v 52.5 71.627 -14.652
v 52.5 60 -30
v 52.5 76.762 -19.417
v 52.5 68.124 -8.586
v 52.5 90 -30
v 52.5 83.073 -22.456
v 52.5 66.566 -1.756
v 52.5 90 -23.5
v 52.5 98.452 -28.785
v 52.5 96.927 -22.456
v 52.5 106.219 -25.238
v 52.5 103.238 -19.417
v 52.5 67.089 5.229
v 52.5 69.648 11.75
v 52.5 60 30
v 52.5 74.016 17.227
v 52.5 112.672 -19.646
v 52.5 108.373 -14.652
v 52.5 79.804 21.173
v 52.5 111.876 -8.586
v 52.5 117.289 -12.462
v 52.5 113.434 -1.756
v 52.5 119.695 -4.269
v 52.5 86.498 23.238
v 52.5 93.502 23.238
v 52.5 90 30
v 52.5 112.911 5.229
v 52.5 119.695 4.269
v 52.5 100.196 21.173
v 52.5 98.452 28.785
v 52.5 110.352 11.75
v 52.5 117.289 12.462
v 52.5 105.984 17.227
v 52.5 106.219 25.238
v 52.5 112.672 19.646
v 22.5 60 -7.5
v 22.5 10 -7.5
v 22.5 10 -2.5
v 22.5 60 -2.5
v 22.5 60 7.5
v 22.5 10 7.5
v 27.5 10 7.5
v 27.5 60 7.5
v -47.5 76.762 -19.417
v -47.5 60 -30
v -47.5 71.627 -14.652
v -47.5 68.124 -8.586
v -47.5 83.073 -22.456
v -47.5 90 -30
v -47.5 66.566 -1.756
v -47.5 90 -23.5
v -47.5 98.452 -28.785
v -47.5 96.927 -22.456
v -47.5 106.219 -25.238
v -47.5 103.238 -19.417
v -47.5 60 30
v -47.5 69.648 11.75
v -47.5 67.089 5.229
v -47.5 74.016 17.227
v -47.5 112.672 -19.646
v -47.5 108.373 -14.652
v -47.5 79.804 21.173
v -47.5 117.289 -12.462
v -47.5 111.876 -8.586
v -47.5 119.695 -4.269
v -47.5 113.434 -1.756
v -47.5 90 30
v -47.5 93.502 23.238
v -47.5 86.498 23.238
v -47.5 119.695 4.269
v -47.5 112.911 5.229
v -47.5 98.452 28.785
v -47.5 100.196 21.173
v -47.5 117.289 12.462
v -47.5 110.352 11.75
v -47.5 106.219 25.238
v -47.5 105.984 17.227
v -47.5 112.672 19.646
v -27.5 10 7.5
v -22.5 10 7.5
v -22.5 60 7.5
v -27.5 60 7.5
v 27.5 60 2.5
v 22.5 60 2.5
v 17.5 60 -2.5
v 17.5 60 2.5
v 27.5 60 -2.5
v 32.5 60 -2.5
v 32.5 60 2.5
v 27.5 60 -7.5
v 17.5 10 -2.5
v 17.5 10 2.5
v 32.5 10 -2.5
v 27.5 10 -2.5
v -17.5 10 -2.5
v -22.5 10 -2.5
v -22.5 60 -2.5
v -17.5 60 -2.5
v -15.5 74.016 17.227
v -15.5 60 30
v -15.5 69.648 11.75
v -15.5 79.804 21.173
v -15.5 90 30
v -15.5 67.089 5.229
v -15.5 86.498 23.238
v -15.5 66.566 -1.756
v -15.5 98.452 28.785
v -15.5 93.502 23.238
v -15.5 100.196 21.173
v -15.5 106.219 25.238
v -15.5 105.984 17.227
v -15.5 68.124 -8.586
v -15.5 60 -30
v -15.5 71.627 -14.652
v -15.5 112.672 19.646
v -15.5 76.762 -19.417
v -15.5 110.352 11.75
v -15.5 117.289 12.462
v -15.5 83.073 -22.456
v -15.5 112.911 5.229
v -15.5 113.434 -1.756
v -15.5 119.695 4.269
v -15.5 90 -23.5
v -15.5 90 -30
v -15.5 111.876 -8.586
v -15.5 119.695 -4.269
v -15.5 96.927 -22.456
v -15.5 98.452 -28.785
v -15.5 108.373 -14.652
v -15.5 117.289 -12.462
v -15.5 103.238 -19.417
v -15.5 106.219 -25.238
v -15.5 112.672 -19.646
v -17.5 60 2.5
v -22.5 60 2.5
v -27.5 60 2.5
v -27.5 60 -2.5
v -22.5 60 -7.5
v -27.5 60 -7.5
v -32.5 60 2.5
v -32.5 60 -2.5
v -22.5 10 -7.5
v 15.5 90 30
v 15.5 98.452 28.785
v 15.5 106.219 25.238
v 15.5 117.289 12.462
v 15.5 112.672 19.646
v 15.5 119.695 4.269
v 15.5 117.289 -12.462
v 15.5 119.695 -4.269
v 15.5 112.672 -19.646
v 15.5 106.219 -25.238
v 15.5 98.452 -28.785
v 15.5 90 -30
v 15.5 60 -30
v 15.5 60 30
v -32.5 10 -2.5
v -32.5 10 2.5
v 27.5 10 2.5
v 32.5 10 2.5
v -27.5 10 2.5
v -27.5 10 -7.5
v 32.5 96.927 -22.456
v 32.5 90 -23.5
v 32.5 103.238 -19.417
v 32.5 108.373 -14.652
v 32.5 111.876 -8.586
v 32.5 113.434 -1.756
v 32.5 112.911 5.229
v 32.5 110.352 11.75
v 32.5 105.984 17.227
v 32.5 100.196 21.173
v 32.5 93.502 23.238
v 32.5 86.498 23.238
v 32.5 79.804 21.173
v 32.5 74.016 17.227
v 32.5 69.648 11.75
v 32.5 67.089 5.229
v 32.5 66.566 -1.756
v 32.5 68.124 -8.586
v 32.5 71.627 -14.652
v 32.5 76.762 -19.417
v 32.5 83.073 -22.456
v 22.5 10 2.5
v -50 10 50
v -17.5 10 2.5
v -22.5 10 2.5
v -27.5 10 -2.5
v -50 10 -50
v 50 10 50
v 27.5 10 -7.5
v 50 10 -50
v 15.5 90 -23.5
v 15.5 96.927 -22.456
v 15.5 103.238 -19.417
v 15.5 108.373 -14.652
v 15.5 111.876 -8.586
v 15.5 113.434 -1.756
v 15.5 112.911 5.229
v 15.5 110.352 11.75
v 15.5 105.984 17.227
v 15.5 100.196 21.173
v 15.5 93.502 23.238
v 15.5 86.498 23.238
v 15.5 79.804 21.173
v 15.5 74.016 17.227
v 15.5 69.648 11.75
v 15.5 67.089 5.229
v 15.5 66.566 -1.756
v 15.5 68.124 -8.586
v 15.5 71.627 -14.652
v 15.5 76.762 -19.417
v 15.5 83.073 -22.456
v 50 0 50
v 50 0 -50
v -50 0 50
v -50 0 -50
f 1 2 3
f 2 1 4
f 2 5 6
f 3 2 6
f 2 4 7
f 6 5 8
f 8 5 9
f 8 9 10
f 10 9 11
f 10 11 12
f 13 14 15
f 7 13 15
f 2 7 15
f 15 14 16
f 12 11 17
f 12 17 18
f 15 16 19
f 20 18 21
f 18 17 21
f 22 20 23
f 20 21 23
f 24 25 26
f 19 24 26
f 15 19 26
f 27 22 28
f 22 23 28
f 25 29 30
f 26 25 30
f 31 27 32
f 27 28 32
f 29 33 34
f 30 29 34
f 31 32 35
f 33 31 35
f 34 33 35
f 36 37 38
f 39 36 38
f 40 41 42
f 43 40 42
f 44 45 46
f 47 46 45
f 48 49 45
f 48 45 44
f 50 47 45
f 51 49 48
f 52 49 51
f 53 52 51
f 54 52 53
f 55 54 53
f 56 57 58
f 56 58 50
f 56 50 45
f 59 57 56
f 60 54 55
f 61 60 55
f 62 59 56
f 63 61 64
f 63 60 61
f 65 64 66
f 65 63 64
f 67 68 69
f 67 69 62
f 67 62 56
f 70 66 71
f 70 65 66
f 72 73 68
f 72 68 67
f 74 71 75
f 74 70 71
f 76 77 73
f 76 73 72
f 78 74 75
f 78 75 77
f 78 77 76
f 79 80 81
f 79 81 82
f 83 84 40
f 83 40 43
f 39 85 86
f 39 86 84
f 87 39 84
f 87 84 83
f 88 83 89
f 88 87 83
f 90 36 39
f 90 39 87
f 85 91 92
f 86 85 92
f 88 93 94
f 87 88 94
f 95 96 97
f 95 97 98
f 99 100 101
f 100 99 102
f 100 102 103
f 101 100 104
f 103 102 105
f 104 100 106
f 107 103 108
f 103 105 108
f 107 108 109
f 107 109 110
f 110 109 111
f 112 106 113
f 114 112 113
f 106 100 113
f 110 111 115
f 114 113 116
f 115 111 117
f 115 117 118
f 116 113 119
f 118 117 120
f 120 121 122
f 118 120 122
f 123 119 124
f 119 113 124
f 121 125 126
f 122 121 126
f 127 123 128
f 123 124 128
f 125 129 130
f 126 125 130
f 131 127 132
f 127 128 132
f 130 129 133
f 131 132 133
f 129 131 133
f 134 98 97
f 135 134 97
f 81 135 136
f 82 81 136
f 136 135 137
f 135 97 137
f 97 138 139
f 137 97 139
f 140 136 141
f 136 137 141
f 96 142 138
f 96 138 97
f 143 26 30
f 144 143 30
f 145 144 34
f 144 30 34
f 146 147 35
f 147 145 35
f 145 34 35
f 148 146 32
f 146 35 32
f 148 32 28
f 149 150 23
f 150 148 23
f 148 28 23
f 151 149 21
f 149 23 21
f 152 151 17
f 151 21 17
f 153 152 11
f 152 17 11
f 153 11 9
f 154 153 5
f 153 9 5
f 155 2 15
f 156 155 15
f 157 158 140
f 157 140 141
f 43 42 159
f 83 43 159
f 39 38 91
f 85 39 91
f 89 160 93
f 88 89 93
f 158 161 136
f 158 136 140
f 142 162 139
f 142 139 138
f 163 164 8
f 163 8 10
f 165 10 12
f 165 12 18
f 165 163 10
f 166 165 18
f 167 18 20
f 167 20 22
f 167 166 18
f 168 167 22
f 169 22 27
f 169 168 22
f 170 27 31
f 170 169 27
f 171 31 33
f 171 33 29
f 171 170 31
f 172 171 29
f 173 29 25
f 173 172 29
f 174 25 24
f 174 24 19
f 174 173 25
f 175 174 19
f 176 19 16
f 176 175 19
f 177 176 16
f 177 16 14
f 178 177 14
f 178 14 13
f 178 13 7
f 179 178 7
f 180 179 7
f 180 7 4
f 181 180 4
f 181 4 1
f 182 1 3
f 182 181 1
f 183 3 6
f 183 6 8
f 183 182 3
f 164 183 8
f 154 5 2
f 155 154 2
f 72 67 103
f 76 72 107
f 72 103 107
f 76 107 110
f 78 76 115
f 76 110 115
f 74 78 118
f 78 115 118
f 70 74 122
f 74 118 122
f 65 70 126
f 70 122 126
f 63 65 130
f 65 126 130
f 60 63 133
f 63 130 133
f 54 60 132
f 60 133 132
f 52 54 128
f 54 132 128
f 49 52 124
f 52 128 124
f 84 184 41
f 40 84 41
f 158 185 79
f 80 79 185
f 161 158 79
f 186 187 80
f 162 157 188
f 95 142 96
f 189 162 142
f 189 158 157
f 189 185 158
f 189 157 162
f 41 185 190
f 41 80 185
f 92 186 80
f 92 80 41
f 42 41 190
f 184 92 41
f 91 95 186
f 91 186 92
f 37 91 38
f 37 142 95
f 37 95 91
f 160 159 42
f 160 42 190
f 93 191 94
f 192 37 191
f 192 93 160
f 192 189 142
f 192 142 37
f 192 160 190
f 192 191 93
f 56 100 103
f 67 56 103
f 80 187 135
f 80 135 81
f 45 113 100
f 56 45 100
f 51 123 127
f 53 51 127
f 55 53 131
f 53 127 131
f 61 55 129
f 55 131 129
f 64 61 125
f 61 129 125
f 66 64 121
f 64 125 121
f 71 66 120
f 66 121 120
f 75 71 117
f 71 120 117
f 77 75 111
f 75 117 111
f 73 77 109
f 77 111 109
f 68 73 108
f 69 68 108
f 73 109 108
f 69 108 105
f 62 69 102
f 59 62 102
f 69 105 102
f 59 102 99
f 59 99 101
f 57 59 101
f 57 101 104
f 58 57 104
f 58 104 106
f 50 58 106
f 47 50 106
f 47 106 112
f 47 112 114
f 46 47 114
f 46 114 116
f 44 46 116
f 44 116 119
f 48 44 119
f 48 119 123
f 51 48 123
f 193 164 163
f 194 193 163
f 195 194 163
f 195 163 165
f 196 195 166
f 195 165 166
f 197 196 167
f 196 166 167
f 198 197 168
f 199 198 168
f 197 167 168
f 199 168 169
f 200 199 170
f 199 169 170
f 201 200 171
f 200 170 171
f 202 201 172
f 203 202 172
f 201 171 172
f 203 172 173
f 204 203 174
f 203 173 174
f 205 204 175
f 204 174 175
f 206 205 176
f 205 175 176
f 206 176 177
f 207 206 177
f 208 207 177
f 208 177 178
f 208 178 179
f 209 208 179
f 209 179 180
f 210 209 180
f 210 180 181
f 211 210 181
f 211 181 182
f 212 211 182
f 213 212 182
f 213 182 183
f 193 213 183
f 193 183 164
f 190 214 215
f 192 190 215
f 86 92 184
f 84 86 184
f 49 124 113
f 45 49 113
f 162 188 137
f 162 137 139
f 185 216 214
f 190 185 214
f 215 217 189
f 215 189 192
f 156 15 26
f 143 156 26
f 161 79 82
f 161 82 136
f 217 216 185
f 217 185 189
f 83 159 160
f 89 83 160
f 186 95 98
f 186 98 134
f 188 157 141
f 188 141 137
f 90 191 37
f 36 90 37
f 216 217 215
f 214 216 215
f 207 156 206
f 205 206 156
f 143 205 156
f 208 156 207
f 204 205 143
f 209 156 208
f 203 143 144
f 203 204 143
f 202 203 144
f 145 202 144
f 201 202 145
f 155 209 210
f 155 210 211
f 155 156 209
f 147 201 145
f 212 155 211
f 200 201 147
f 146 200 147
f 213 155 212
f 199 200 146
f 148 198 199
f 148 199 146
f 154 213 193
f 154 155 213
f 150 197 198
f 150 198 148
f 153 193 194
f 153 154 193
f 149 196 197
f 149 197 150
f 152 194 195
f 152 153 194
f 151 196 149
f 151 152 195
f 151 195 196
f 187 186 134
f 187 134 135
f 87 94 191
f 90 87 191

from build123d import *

# Parameters (mm, degrees)
ESQUISSE1_W             = 100
ESQUISSE1_H             = 100
BOSS_EXTRU_1_DEPTH      = 10
BOSS_EXTRU_2_DEPTH      = 50
ESQUISSE3_R             = 23.5
BOSS_EXTRU_3_DEPTH      = 20
BOSS_EXTRU_3_DEPTH_BACK = 80
ESQUISSE4_W             = 31
ESQUISSE4_H             = 60
ENL_V_MAT_EXTRU_1_DEPTH = 60


with BuildPart() as part:
    # Esquisse1 → Boss.-Extru.1 (new body)
    with BuildSketch(Plane(origin=(0, 0, 0), x_dir=(1, 0, 0), z_dir=(0, 1, 0))):
        Rectangle(ESQUISSE1_W, ESQUISSE1_H)
    extrude(amount=BOSS_EXTRU_1_DEPTH)

    # Esquisse2 → Boss.-Extru.2 (add)
    with BuildSketch(Plane(origin=(0, 10, 0), x_dir=(1, 0, 0), z_dir=(0, 1, 0))):
        Polygon((-27.5, 2.5), (-27.5, 7.5), (-22.5, 7.5), (-22.5, 2.5), (-17.5, 2.5), (-17.5, -2.5), (-22.5, -2.5), (-22.5, -7.5), (-27.5, -7.5), (-27.5, -2.5), (-32.5, -2.5), (-32.5, 2.5), align=None)
        Polygon((27.5, -7.5), (27.5, -2.5), (32.5, -2.5), (32.5, 2.5), (27.5, 2.5), (27.5, 7.5), (22.5, 7.5), (22.5, 2.5), (17.5, 2.5), (17.5, -2.5), (22.5, -2.5), (22.5, -7.5), align=None)
    extrude(amount=BOSS_EXTRU_2_DEPTH)


with BuildPart() as body_2:
    # Esquisse3 → Boss.-Extru.3 (new body, two sides)
    with BuildSketch(Plane(origin=(32.5, 0, 0), x_dir=(0, 0, -1), z_dir=(1, 0, 0))) as boss_extru_3_sk:
        with BuildLine():
            Line((0, 60), (-30, 60))
            Line((-30, 60), (-30, 90))
            ThreePointArc((-30, 90), (0, 120), (30, 90))
            Line((30, 90), (30, 60))
            Line((30, 60), (0, 60))
        make_face()
        with Locations((0, 90)):
            Circle(ESQUISSE3_R, mode=Mode.SUBTRACT)
    extrude(amount=BOSS_EXTRU_3_DEPTH)
    extrude(boss_extru_3_sk.sketch, amount=-BOSS_EXTRU_3_DEPTH_BACK)

    # Esquisse4 → Enlèv. mat.-Extru.1 (cut)
    with BuildSketch(Plane(origin=(0, 0, -30), x_dir=(-1, 0, 0), z_dir=(0, 0, -1))):
        with Locations((0, 90)):
            Rectangle(ESQUISSE4_W, ESQUISSE4_H)
    extrude(amount=-ENL_V_MAT_EXTRU_1_DEPTH, mode=Mode.SUBTRACT)


solid = Compound([part.part, body_2.part])
